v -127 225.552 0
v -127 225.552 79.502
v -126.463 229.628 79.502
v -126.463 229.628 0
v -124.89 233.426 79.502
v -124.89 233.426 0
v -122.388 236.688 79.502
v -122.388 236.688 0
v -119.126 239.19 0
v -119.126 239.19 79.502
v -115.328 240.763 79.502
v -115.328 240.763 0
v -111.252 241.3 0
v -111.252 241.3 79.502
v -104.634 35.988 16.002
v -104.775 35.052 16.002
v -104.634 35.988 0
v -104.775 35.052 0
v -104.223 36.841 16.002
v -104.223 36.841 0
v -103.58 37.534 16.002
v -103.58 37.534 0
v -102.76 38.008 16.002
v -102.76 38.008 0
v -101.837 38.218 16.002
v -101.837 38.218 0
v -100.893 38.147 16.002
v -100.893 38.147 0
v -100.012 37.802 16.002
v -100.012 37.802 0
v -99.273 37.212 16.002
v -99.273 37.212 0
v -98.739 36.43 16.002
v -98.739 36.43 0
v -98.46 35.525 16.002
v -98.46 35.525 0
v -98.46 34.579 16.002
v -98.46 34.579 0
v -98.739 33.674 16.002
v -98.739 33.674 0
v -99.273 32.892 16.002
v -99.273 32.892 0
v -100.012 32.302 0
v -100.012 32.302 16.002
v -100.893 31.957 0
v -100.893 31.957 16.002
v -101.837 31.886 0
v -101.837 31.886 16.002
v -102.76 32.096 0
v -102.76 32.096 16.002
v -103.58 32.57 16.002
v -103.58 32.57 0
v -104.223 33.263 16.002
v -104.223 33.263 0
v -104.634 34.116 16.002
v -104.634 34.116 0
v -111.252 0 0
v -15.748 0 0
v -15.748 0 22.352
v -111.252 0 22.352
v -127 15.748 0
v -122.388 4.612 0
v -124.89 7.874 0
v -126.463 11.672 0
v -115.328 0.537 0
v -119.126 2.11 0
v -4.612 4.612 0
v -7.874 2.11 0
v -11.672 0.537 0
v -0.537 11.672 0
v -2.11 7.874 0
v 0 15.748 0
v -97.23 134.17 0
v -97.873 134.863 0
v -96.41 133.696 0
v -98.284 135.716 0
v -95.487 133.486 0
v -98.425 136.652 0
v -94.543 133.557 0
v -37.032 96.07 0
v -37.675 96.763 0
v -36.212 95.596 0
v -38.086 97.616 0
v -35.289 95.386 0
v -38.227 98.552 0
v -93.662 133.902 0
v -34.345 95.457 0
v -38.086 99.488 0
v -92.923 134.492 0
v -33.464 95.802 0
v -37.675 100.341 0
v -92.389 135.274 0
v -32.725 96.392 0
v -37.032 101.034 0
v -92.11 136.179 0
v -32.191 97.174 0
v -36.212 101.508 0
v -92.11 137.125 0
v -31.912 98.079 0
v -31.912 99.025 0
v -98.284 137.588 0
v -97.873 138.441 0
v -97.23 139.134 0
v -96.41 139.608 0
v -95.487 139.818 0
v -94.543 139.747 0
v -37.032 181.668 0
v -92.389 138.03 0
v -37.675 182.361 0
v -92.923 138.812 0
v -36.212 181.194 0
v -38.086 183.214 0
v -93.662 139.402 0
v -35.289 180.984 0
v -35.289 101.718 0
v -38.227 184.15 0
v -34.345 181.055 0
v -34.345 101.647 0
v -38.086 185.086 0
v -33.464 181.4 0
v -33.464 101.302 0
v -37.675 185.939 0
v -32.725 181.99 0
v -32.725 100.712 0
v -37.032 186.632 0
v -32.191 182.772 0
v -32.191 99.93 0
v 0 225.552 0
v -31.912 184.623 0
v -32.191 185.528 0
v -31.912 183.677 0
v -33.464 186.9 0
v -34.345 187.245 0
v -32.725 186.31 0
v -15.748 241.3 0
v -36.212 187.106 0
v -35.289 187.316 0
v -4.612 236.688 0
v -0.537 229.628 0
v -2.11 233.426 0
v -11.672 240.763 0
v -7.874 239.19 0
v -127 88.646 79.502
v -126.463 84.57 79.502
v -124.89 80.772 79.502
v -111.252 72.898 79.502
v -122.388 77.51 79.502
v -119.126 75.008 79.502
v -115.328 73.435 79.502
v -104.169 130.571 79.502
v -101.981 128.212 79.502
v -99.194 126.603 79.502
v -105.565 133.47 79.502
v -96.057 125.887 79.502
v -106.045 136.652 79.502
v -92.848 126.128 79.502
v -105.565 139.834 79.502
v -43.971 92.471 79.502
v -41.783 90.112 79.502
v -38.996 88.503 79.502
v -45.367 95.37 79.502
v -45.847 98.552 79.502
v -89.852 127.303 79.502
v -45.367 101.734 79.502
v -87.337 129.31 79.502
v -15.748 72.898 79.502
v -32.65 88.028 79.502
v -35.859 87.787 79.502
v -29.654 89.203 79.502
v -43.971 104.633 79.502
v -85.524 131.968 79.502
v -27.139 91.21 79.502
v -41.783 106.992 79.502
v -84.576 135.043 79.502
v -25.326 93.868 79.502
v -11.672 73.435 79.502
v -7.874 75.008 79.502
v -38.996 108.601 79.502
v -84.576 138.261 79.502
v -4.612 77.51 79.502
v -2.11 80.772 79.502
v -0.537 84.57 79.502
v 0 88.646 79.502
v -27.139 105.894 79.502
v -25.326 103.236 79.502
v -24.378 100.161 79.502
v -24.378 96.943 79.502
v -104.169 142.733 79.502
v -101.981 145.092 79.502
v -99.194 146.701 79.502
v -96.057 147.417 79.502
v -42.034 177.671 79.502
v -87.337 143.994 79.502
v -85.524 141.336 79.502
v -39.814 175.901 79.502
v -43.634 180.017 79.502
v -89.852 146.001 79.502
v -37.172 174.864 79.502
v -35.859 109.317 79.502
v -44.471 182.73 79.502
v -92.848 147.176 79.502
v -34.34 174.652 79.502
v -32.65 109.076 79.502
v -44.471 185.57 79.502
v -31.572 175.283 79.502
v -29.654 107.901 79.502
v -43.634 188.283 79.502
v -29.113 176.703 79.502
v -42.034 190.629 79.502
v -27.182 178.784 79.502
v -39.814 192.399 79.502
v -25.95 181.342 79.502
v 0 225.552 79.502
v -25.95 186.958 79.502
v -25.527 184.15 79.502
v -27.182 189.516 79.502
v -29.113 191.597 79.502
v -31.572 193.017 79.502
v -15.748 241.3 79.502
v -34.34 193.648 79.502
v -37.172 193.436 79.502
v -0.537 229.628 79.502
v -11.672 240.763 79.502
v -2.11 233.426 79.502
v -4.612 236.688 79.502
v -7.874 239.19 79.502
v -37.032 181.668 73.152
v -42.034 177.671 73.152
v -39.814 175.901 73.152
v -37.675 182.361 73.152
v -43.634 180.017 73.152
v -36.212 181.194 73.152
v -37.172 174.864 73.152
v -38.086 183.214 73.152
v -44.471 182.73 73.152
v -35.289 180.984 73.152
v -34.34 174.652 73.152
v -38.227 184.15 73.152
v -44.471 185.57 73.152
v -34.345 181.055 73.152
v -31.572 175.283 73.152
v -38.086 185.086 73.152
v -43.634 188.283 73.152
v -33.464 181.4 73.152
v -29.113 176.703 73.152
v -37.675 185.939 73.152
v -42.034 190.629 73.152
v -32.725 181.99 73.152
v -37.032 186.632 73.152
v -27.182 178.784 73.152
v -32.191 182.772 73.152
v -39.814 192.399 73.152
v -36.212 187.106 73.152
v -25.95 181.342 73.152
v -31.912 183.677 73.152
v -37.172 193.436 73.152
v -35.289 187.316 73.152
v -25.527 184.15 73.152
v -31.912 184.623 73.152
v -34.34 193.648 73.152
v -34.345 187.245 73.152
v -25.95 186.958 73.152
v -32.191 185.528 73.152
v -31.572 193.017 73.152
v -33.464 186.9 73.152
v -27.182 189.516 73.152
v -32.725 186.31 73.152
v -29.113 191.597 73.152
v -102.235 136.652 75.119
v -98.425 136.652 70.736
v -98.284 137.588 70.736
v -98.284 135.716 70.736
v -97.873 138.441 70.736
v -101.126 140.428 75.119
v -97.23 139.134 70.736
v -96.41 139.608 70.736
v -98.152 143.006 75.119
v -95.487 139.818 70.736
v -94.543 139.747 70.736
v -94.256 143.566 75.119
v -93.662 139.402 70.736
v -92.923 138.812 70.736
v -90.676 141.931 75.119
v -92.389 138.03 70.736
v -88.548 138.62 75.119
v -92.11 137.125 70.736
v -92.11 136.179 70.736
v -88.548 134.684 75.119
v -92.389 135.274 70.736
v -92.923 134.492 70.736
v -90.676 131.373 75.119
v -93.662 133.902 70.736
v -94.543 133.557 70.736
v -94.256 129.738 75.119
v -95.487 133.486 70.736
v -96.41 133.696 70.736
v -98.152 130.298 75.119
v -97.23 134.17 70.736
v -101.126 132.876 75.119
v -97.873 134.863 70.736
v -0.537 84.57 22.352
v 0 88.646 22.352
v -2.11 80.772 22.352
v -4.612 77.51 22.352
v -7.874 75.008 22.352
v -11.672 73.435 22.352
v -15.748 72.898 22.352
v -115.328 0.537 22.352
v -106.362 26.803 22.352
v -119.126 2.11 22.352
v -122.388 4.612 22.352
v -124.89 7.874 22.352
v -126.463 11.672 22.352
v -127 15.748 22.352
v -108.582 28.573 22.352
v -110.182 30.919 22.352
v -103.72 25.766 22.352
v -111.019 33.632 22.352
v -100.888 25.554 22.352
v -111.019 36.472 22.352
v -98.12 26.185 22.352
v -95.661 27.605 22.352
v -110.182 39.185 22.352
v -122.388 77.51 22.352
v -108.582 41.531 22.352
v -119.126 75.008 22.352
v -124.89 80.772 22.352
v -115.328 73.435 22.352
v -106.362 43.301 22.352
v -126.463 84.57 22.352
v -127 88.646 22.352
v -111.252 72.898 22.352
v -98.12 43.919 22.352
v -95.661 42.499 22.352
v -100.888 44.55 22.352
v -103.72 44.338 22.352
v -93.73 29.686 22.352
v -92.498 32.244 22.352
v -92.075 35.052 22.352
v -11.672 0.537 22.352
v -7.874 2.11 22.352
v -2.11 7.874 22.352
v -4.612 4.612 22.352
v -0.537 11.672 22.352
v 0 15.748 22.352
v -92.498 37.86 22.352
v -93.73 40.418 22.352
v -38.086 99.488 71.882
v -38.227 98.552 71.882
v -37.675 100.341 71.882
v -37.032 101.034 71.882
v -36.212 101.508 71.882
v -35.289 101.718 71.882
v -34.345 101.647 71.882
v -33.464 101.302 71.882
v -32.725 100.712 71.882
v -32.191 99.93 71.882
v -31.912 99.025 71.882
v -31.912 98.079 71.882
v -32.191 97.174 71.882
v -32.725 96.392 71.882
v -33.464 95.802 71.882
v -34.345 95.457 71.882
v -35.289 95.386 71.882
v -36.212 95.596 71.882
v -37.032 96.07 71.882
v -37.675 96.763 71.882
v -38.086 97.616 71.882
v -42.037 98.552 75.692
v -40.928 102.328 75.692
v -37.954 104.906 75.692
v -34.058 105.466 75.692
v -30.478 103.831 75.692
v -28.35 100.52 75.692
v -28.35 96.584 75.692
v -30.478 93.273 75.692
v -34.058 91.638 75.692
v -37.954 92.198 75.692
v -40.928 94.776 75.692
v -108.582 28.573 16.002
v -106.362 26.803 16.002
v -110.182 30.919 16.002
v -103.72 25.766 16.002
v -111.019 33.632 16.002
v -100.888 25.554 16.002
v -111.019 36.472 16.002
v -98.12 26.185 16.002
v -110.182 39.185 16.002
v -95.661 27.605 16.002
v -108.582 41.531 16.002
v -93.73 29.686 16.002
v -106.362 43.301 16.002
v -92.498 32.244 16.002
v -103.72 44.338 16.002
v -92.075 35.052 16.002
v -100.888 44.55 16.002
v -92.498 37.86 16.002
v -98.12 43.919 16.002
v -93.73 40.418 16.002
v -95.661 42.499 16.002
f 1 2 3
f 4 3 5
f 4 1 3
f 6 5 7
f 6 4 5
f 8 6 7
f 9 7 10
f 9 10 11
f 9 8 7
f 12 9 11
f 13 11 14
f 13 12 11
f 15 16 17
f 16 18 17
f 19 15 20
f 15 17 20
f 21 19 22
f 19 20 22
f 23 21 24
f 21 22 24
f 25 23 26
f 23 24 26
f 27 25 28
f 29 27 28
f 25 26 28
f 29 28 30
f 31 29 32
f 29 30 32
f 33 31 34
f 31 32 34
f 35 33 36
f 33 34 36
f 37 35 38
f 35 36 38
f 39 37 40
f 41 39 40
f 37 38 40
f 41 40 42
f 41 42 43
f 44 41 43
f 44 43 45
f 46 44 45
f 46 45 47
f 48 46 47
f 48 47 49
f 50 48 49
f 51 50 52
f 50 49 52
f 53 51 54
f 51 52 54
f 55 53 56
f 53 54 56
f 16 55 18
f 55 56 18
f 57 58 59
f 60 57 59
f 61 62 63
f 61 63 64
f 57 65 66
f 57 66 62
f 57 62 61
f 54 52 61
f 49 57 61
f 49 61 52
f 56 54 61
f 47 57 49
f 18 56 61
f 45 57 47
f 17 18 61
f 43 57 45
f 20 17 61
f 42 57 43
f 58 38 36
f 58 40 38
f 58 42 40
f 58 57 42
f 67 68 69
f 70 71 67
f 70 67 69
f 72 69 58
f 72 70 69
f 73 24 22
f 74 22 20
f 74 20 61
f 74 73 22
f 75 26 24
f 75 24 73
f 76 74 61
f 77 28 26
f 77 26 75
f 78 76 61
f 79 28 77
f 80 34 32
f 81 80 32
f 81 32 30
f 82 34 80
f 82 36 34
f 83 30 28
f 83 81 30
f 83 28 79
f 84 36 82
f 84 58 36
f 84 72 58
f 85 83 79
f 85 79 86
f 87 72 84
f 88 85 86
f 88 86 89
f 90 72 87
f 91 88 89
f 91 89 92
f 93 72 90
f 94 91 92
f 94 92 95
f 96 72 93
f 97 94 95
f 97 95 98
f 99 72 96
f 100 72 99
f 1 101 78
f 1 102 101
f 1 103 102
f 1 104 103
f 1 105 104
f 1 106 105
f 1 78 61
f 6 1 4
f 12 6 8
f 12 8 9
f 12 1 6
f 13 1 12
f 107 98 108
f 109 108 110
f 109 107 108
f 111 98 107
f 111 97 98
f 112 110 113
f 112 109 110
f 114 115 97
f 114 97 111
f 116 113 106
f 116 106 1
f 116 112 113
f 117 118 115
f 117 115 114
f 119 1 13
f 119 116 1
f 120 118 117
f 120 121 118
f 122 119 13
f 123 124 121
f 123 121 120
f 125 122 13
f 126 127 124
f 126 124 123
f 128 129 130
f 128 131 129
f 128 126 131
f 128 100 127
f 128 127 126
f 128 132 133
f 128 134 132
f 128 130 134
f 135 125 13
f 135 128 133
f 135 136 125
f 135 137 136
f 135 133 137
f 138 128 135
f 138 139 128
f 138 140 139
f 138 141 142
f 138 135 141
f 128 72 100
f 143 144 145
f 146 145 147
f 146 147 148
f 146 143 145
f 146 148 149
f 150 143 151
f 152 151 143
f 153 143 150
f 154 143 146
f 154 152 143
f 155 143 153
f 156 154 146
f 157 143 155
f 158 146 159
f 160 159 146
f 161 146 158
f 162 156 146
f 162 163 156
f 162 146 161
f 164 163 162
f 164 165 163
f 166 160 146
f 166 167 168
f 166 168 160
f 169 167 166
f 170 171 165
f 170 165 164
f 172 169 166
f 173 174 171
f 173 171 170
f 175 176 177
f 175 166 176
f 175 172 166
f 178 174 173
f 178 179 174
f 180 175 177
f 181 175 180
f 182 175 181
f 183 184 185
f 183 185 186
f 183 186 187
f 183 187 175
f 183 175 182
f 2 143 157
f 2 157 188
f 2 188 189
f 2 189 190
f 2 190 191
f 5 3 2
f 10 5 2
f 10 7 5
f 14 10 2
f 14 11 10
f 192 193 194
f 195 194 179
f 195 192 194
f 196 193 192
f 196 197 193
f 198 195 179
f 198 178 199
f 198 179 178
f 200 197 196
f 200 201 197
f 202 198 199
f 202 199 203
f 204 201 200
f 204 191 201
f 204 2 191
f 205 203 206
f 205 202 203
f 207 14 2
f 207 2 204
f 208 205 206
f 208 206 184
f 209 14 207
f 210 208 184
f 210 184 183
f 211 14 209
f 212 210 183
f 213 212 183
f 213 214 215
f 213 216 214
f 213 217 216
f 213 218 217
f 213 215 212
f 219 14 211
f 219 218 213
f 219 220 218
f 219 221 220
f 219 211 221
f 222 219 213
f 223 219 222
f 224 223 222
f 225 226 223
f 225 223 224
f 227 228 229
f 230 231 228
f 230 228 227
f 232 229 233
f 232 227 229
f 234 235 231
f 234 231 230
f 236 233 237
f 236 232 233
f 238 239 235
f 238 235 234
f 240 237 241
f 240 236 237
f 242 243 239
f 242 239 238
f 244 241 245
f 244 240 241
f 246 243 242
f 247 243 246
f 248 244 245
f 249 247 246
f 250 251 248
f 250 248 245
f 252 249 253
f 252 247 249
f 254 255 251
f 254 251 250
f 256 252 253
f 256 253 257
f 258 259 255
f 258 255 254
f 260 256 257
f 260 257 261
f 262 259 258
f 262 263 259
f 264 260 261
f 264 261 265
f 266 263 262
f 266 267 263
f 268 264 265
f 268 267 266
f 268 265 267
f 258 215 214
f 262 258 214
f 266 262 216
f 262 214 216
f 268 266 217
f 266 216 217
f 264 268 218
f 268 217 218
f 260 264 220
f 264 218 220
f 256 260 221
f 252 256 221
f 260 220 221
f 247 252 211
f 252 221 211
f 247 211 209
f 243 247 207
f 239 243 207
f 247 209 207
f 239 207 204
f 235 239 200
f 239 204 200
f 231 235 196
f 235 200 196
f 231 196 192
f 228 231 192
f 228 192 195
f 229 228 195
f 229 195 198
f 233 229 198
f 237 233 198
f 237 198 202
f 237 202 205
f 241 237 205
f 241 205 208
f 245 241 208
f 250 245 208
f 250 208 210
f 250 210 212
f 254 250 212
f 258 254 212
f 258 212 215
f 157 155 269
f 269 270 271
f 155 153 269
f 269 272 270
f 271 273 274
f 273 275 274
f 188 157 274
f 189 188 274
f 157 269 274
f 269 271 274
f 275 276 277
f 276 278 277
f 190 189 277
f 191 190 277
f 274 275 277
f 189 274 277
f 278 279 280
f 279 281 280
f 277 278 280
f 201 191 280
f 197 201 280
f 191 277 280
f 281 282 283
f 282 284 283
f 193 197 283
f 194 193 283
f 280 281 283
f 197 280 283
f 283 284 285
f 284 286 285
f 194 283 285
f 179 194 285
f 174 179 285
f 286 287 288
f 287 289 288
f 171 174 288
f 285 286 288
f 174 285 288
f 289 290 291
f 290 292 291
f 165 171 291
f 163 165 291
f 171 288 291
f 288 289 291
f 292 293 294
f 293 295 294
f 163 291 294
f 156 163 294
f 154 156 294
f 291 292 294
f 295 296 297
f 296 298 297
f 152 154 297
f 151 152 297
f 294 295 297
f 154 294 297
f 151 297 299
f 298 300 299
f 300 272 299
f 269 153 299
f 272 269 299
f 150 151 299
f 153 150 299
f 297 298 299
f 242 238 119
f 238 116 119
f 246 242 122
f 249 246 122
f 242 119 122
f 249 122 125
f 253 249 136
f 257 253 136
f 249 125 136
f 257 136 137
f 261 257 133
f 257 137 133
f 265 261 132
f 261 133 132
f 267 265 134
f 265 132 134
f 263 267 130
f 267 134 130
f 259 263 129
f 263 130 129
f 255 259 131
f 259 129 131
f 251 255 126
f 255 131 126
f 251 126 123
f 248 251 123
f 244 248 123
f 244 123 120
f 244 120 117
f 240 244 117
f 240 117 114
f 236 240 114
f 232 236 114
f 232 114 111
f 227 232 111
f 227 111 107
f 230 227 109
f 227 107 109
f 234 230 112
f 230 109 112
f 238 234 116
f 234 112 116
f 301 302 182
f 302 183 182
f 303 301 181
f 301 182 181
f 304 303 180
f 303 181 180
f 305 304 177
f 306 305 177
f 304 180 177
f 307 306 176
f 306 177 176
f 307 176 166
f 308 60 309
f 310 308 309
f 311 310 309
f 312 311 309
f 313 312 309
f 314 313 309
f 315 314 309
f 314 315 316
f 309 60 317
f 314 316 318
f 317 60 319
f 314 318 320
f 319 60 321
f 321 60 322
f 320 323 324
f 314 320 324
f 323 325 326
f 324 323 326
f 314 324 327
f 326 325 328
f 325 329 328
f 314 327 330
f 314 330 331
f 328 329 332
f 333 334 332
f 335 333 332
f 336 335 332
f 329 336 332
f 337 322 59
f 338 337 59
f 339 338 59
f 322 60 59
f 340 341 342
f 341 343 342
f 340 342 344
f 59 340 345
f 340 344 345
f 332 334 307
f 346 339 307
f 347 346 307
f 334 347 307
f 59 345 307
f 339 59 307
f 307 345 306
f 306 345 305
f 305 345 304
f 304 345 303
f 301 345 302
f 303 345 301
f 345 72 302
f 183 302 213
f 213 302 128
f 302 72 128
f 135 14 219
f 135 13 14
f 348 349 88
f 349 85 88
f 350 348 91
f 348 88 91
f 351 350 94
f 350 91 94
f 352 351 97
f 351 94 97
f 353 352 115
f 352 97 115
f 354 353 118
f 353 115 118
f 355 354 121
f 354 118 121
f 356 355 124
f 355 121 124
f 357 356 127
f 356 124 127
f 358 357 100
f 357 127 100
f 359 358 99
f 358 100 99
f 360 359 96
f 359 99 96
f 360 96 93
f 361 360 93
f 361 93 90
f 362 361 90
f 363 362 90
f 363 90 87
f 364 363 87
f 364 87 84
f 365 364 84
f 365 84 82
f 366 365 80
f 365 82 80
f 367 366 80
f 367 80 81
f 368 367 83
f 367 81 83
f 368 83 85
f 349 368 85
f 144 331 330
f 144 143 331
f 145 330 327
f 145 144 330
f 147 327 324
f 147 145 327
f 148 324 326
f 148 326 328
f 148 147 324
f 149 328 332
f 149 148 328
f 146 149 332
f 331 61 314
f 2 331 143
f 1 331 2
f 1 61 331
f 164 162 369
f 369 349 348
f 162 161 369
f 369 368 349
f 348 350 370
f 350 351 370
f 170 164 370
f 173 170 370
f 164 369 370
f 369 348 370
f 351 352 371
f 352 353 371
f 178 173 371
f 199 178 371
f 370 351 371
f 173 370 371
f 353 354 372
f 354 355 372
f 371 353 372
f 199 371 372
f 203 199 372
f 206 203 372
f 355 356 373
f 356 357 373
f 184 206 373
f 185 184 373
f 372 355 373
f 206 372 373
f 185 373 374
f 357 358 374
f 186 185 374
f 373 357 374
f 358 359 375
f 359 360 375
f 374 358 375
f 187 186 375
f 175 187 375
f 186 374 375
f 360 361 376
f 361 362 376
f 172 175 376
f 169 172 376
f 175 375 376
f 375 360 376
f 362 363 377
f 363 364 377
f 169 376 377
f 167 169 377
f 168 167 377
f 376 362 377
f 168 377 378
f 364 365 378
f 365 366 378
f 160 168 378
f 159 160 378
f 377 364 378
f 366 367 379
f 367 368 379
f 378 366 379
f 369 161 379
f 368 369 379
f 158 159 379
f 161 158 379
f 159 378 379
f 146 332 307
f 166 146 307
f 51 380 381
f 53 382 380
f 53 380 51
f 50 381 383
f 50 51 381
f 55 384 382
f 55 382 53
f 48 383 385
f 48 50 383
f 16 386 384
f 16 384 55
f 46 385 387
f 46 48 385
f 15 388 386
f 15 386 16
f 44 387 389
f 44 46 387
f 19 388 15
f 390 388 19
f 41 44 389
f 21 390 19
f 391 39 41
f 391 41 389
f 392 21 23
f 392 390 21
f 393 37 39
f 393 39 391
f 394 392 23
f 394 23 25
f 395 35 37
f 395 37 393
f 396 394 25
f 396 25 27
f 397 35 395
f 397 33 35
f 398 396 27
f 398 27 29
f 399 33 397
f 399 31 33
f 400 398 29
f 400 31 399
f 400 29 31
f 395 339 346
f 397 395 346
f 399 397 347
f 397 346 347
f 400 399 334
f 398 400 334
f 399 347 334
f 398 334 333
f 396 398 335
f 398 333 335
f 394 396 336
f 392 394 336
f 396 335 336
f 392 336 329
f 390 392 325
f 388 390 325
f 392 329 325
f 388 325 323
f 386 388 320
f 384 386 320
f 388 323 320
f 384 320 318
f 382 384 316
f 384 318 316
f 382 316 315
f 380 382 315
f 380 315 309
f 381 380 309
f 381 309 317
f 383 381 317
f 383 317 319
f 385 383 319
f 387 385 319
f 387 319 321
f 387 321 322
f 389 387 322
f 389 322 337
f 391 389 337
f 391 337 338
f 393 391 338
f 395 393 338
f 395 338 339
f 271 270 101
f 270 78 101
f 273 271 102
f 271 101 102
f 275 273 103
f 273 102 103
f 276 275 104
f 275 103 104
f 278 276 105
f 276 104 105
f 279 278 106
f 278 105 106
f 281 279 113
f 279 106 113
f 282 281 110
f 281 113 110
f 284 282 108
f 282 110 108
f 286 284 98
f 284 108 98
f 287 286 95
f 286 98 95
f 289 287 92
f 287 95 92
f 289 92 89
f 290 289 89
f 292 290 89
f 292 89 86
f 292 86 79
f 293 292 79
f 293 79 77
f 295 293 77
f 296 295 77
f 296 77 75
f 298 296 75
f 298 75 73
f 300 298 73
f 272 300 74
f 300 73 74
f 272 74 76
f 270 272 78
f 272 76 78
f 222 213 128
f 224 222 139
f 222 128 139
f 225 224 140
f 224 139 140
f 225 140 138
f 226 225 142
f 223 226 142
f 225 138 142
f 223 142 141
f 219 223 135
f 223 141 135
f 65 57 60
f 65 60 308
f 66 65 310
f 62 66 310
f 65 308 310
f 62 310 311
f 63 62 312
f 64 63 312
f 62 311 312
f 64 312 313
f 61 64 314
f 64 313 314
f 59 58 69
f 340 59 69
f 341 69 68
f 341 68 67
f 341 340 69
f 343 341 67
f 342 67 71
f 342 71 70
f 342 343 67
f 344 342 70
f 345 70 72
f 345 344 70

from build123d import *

# Parameters (mm, degrees)
F0_W            = 241.3
F0_H            = 22.352
F1_DEPTH        = 127
F2_R            = 15.748
F3_W            = 127
F3_H            = 168.402
F4_DEPTH        = 57.15
F5_R            = 15.748
F7_D            = 6.35
F7_CBORE_D      = 19.05
F7_CBORE_DEPTH  = 6.35
F9_D            = 6.35
F9_CSINK_D      = 21.59
F9_CSINK_ANGLE  = 82
F10_D           = 6.35
F10_CSINK_D     = 21.59
F10_CSINK_ANGLE = 90
F11_D           = 6.35
F11_CBORE_D     = 19.05
F11_CBORE_DEPTH = 6.35


with BuildPart() as f1:
    # F0 (on Right) → F1 (new body)
    with BuildSketch(Plane.YZ):
        with Locations((120.65, 11.176)):
            Rectangle(F0_W, F0_H)
    extrude(amount=-F1_DEPTH)

    # F2
    f2_edges = [f1.edges().sort_by_distance(p)[0] for p in [
        (0, 0, 11.176),
        (-127, 0, 11.176),
    ]]
    fillet(f2_edges, radius=F2_R)

    # F3 (on face) → F4 (join)
    with BuildSketch(Plane.XY.offset(22.352)):
        with Locations((-63.5, 157.099)):
            Rectangle(F3_W, F3_H)
    extrude(amount=F4_DEPTH)

    # F5
    f5_edges = [f1.edges().sort_by_distance(p)[0] for p in [
        (0, 72.898, 50.927),
        (-127, 72.898, 50.927),
        (0, 241.3, 39.751),
        (-127, 241.3, 39.751),
    ]]
    fillet(f5_edges, radius=F5_R)

    # F7 (through all)
    with Locations(Plane.XY.offset(22.352)):
        with Locations((-101.6, 35.052)):
            CounterBoreHole(F7_D / 2, F7_CBORE_D / 2, F7_CBORE_DEPTH)

    # F9 (through all)
    with Locations(Plane.XY.offset(79.502)):
        with Locations((-95.25, 136.652)):
            CounterSinkHole(F9_D / 2, F9_CSINK_D / 2, counter_sink_angle=F9_CSINK_ANGLE)

    # F10 (through all)
    with Locations(Plane.XY.offset(79.502)):
        with Locations((-35.052, 98.552)):
            CounterSinkHole(F10_D / 2, F10_CSINK_D / 2, counter_sink_angle=F10_CSINK_ANGLE)

    # F11 (through all)
    with Locations(Plane.XY.offset(79.502)):
        with Locations((-35.052, 184.15)):
            CounterBoreHole(F11_D / 2, F11_CBORE_D / 2, F11_CBORE_DEPTH)


solid = f1.part
